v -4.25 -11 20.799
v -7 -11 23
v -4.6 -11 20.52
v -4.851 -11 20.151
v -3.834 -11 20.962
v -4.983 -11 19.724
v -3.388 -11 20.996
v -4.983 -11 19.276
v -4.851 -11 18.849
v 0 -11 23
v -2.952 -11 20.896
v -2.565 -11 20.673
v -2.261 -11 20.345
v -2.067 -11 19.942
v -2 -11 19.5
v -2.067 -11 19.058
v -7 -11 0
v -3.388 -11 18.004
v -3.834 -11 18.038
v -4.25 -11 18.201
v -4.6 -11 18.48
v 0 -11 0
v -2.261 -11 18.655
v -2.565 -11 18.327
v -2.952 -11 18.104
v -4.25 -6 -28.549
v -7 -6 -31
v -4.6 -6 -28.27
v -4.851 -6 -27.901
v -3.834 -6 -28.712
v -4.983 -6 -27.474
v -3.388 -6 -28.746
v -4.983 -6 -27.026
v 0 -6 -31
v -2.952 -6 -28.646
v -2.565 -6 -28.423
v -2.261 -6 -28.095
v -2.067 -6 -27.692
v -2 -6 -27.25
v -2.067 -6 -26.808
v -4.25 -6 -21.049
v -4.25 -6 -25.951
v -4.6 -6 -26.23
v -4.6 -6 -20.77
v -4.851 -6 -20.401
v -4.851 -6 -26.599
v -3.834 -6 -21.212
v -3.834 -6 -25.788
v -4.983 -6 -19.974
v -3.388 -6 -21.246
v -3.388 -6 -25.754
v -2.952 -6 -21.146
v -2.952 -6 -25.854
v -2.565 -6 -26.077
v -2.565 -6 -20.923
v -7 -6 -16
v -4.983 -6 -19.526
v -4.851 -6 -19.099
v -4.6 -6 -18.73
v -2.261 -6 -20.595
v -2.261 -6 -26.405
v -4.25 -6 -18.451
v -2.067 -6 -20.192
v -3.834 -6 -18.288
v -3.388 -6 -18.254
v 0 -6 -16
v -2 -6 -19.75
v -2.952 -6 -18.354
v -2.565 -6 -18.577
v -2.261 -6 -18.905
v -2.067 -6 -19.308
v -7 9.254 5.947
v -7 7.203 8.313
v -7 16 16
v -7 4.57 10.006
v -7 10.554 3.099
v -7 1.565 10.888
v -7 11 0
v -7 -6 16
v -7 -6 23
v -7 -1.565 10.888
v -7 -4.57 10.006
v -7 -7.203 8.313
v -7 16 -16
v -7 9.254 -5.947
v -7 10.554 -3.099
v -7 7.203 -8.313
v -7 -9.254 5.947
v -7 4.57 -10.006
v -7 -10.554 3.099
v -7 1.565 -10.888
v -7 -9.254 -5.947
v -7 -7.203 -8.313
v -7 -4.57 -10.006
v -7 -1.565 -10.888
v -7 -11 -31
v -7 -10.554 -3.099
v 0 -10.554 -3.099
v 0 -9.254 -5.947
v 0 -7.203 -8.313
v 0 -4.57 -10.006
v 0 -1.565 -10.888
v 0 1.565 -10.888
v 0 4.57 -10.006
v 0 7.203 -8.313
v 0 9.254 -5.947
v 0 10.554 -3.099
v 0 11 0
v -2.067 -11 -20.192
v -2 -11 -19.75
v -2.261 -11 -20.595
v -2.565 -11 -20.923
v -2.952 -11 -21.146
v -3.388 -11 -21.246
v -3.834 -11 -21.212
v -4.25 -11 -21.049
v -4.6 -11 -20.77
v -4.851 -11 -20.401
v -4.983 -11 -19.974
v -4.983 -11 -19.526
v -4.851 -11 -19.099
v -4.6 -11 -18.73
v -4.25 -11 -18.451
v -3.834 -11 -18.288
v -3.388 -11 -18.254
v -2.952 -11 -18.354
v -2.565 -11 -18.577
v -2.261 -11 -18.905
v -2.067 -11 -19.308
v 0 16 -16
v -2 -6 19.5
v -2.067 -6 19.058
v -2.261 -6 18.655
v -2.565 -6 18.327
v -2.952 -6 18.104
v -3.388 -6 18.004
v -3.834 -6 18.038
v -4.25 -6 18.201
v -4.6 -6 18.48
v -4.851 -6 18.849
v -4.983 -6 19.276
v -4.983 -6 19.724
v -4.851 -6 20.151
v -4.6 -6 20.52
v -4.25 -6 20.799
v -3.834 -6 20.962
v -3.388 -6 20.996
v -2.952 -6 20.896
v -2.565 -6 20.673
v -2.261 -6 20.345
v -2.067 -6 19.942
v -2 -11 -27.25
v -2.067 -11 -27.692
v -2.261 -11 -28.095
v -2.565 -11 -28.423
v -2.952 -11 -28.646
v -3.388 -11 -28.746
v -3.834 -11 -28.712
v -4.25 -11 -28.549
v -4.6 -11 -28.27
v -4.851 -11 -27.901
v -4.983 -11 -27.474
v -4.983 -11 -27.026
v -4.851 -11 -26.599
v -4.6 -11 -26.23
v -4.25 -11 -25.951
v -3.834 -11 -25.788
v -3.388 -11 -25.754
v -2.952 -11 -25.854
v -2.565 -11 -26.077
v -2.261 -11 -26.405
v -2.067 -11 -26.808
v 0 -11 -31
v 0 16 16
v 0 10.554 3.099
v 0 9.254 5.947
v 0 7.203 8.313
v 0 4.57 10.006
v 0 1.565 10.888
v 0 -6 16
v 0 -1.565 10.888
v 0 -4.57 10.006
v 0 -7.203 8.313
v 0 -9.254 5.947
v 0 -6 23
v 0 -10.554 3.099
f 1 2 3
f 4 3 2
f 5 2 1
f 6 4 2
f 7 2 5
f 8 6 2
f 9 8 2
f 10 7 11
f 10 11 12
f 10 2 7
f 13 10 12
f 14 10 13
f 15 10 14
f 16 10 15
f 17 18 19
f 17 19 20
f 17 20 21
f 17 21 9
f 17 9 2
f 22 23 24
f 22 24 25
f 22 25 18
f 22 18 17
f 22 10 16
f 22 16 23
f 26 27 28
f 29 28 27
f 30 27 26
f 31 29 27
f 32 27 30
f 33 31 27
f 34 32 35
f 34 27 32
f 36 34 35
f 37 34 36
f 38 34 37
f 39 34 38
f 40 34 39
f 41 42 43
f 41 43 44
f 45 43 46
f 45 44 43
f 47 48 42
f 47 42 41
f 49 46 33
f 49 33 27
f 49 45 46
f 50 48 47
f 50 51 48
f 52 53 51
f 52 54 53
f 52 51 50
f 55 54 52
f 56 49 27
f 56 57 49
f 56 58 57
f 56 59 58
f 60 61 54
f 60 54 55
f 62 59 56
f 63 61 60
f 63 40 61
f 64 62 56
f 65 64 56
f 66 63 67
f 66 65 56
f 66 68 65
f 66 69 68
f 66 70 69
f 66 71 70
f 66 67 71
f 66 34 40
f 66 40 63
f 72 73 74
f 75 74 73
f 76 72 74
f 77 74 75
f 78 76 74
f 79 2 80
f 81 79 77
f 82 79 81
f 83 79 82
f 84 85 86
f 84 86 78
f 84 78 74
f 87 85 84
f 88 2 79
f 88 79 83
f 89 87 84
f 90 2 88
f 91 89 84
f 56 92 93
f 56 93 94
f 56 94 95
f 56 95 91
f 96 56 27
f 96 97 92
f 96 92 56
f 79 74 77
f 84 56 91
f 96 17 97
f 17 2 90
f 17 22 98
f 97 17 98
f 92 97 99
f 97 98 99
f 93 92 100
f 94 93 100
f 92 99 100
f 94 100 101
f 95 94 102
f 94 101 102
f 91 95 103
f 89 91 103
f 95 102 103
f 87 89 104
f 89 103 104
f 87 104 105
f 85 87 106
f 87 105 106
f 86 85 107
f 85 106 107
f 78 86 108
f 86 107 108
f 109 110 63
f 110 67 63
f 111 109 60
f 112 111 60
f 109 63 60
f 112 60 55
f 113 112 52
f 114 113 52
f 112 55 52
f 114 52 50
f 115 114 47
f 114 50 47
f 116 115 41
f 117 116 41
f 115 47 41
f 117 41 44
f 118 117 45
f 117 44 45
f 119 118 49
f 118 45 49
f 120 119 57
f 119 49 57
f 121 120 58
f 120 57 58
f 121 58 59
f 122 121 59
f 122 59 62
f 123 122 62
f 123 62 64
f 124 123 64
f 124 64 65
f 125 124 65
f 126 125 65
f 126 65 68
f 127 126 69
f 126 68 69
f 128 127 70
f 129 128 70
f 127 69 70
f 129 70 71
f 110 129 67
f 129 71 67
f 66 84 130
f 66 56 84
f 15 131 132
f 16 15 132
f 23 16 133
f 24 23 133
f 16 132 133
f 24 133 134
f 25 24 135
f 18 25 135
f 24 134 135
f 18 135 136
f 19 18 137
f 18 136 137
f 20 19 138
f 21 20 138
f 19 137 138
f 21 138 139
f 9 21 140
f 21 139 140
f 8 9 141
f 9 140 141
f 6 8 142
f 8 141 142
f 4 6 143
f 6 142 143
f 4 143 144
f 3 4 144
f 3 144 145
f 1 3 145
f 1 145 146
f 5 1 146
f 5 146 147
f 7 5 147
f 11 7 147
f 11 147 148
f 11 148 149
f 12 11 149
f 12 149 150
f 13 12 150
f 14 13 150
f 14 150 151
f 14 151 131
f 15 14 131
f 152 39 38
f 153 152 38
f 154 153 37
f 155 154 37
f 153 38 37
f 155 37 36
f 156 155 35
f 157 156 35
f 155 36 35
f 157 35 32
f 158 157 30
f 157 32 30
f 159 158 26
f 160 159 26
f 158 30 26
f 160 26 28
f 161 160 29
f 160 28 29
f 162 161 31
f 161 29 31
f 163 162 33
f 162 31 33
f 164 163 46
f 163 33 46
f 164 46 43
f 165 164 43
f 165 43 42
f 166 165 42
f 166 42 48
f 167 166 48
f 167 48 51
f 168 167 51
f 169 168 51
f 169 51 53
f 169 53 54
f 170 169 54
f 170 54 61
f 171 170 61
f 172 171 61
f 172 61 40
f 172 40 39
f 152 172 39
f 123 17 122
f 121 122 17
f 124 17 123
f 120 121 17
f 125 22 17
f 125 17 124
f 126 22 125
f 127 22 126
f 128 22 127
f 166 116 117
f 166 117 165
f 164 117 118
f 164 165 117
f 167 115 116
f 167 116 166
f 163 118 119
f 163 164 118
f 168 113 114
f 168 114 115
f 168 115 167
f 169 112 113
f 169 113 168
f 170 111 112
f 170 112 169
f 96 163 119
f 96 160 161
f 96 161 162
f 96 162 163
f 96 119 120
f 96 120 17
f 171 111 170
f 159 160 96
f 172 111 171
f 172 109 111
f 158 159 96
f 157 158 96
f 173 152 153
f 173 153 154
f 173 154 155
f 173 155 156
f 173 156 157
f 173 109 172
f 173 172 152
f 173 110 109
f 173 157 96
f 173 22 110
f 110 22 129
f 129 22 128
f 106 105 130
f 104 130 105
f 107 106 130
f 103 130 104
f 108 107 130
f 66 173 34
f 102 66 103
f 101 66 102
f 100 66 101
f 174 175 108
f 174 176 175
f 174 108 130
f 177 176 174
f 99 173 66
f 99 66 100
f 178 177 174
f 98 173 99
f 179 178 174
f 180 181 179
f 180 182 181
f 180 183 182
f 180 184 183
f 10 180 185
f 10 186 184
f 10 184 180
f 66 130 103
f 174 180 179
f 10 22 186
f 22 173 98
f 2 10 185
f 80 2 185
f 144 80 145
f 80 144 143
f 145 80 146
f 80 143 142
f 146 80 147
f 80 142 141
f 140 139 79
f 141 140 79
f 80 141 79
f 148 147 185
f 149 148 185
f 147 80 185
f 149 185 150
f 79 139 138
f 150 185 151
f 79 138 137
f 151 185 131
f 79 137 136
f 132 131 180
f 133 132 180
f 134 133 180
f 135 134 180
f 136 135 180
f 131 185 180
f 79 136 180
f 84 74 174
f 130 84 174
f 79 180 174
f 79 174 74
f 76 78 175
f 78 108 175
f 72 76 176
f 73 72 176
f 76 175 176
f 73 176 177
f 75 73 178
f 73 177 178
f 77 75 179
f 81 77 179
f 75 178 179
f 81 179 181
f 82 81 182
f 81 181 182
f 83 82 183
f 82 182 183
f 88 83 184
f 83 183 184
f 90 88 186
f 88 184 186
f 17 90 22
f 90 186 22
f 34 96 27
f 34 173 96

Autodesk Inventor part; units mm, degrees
ref_plane "YZ Plane" through (0, 0, 0) normal (1, 0, 0) x (0, 1, 0)
ref_plane "XZ Plane" through (0, 0, 0) normal (0, 1, 0) x (-1, 0, 0)
ref_plane "XY Plane" through (0, 0, 0) normal (0, 0, 1) x (1, 0, 0)
sketch "Sketch1" plane through (0, 0, 0) normal (1, 0, 0) x (0, 1, 0)
  circle A0 centre (0, 0) radius 11
  line L0 (0, 16) -> (-11, 16)
  line L1 (-11, 16) -> (-11, -16)
  line L2 (-11, -16) -> (11, -16)
  line L3 (11, -16) -> (11, 16)
  line L4 (11, 16) -> (0, 16)
  line L5 (-11, 16) -> (-11, 23)
  line L6 (-11, 23) -> (-6, 23)
  line L7 (-6, 23) -> (-6, 16)
  line L8 (-11, -16) -> (-11, -31)
  line L9 (-11, -31) -> (-6, -31)
  line L10 (-6, -31) -> (-6, -16)
  point P0 (11, 0)
  point P1 (-11, 0)
  dimension "d0" = 22
  dimension "d4" = 7
  dimension "d5" = 5
  dimension "d6" = 15
extrude "Extrusion1" add sketch "Sketch1" against normal blind 7 contours L3 L2 L1 A0 | A0 L1 L0 L4 L3 | L5 L6 L7 L0 | L2 L10 L9 L8
sketch "Sketch2" plane through (0, 11, 16) normal (0, 1, 0) x (1, 0, 0)
  line L0 (-7, 16) -> (-7, 32) projected
  line L1 (0, 16) -> (0, 0) projected
  line L2 (-7, 32) -> (0, 32)
  line L3 (0, 32) -> (0, 0)
  line L4 (0, 0) -> (-7, 0)
  line L5 (-7, 0) -> (-7, 32)
extrude "Extrusion2" add sketch "Sketch2" along normal blind 5
sketch "Sketch3" plane through (0, -6, 23) normal (0, 1, 0) x (1, 0, 0)
  line L0 (0, 7) -> (0, 0) projected
  line L1 (-7, 0) -> (-7, 7) projected
  line L2 (0, 0) -> (-7, 0) projected
  line L3 (0, 7) -> (-7, 7) projected
  circle A0 centre (-3.5, 3.5) radius 1.5
  line L4 (0, 54) -> (0, 39) projected
  line L5 (-7, 39) -> (-7, 54) projected
  line L6 (0, 54) -> (-7, 54) projected
  line L7 (0, 39) -> (-7, 39) projected
  line L8 (0, 46.5) -> (0, 39)
  line L9 (0, 23) -> (0, 54) projected
  line L10 (0, 46.5) -> (0, 54)
  line L11 (0, 54) -> (0, 50.25)
  line L12 (-7, 54) -> (-7, 23) projected
  circle A1 centre (-3.5, 42.75) radius 1.5
  circle A2 centre (-3.5, 50.25) radius 1.5
  dimension "d11" = 3
  dimension "d12" = 3
extrude "Extrusion3" cut sketch "Sketch3" against normal blind 5 contours A0
extrude "Extrusion4" cut sketch "Sketch3" against normal blind 5 contours A1
extrude "Extrusion5" cut sketch "Sketch3" against normal blind 5 contours A2
thread "Thread1" size "M3x0.5" class "6H" standard "ANSI Metric M Profile" full length
thread "Thread2" size "M3x0.5" class "6H" standard "ANSI Metric M Profile" full length
thread "Thread3" size "M3x0.5" class "6H" standard "ANSI Metric M Profile" full length
properties part number "aguanta rolinera"
